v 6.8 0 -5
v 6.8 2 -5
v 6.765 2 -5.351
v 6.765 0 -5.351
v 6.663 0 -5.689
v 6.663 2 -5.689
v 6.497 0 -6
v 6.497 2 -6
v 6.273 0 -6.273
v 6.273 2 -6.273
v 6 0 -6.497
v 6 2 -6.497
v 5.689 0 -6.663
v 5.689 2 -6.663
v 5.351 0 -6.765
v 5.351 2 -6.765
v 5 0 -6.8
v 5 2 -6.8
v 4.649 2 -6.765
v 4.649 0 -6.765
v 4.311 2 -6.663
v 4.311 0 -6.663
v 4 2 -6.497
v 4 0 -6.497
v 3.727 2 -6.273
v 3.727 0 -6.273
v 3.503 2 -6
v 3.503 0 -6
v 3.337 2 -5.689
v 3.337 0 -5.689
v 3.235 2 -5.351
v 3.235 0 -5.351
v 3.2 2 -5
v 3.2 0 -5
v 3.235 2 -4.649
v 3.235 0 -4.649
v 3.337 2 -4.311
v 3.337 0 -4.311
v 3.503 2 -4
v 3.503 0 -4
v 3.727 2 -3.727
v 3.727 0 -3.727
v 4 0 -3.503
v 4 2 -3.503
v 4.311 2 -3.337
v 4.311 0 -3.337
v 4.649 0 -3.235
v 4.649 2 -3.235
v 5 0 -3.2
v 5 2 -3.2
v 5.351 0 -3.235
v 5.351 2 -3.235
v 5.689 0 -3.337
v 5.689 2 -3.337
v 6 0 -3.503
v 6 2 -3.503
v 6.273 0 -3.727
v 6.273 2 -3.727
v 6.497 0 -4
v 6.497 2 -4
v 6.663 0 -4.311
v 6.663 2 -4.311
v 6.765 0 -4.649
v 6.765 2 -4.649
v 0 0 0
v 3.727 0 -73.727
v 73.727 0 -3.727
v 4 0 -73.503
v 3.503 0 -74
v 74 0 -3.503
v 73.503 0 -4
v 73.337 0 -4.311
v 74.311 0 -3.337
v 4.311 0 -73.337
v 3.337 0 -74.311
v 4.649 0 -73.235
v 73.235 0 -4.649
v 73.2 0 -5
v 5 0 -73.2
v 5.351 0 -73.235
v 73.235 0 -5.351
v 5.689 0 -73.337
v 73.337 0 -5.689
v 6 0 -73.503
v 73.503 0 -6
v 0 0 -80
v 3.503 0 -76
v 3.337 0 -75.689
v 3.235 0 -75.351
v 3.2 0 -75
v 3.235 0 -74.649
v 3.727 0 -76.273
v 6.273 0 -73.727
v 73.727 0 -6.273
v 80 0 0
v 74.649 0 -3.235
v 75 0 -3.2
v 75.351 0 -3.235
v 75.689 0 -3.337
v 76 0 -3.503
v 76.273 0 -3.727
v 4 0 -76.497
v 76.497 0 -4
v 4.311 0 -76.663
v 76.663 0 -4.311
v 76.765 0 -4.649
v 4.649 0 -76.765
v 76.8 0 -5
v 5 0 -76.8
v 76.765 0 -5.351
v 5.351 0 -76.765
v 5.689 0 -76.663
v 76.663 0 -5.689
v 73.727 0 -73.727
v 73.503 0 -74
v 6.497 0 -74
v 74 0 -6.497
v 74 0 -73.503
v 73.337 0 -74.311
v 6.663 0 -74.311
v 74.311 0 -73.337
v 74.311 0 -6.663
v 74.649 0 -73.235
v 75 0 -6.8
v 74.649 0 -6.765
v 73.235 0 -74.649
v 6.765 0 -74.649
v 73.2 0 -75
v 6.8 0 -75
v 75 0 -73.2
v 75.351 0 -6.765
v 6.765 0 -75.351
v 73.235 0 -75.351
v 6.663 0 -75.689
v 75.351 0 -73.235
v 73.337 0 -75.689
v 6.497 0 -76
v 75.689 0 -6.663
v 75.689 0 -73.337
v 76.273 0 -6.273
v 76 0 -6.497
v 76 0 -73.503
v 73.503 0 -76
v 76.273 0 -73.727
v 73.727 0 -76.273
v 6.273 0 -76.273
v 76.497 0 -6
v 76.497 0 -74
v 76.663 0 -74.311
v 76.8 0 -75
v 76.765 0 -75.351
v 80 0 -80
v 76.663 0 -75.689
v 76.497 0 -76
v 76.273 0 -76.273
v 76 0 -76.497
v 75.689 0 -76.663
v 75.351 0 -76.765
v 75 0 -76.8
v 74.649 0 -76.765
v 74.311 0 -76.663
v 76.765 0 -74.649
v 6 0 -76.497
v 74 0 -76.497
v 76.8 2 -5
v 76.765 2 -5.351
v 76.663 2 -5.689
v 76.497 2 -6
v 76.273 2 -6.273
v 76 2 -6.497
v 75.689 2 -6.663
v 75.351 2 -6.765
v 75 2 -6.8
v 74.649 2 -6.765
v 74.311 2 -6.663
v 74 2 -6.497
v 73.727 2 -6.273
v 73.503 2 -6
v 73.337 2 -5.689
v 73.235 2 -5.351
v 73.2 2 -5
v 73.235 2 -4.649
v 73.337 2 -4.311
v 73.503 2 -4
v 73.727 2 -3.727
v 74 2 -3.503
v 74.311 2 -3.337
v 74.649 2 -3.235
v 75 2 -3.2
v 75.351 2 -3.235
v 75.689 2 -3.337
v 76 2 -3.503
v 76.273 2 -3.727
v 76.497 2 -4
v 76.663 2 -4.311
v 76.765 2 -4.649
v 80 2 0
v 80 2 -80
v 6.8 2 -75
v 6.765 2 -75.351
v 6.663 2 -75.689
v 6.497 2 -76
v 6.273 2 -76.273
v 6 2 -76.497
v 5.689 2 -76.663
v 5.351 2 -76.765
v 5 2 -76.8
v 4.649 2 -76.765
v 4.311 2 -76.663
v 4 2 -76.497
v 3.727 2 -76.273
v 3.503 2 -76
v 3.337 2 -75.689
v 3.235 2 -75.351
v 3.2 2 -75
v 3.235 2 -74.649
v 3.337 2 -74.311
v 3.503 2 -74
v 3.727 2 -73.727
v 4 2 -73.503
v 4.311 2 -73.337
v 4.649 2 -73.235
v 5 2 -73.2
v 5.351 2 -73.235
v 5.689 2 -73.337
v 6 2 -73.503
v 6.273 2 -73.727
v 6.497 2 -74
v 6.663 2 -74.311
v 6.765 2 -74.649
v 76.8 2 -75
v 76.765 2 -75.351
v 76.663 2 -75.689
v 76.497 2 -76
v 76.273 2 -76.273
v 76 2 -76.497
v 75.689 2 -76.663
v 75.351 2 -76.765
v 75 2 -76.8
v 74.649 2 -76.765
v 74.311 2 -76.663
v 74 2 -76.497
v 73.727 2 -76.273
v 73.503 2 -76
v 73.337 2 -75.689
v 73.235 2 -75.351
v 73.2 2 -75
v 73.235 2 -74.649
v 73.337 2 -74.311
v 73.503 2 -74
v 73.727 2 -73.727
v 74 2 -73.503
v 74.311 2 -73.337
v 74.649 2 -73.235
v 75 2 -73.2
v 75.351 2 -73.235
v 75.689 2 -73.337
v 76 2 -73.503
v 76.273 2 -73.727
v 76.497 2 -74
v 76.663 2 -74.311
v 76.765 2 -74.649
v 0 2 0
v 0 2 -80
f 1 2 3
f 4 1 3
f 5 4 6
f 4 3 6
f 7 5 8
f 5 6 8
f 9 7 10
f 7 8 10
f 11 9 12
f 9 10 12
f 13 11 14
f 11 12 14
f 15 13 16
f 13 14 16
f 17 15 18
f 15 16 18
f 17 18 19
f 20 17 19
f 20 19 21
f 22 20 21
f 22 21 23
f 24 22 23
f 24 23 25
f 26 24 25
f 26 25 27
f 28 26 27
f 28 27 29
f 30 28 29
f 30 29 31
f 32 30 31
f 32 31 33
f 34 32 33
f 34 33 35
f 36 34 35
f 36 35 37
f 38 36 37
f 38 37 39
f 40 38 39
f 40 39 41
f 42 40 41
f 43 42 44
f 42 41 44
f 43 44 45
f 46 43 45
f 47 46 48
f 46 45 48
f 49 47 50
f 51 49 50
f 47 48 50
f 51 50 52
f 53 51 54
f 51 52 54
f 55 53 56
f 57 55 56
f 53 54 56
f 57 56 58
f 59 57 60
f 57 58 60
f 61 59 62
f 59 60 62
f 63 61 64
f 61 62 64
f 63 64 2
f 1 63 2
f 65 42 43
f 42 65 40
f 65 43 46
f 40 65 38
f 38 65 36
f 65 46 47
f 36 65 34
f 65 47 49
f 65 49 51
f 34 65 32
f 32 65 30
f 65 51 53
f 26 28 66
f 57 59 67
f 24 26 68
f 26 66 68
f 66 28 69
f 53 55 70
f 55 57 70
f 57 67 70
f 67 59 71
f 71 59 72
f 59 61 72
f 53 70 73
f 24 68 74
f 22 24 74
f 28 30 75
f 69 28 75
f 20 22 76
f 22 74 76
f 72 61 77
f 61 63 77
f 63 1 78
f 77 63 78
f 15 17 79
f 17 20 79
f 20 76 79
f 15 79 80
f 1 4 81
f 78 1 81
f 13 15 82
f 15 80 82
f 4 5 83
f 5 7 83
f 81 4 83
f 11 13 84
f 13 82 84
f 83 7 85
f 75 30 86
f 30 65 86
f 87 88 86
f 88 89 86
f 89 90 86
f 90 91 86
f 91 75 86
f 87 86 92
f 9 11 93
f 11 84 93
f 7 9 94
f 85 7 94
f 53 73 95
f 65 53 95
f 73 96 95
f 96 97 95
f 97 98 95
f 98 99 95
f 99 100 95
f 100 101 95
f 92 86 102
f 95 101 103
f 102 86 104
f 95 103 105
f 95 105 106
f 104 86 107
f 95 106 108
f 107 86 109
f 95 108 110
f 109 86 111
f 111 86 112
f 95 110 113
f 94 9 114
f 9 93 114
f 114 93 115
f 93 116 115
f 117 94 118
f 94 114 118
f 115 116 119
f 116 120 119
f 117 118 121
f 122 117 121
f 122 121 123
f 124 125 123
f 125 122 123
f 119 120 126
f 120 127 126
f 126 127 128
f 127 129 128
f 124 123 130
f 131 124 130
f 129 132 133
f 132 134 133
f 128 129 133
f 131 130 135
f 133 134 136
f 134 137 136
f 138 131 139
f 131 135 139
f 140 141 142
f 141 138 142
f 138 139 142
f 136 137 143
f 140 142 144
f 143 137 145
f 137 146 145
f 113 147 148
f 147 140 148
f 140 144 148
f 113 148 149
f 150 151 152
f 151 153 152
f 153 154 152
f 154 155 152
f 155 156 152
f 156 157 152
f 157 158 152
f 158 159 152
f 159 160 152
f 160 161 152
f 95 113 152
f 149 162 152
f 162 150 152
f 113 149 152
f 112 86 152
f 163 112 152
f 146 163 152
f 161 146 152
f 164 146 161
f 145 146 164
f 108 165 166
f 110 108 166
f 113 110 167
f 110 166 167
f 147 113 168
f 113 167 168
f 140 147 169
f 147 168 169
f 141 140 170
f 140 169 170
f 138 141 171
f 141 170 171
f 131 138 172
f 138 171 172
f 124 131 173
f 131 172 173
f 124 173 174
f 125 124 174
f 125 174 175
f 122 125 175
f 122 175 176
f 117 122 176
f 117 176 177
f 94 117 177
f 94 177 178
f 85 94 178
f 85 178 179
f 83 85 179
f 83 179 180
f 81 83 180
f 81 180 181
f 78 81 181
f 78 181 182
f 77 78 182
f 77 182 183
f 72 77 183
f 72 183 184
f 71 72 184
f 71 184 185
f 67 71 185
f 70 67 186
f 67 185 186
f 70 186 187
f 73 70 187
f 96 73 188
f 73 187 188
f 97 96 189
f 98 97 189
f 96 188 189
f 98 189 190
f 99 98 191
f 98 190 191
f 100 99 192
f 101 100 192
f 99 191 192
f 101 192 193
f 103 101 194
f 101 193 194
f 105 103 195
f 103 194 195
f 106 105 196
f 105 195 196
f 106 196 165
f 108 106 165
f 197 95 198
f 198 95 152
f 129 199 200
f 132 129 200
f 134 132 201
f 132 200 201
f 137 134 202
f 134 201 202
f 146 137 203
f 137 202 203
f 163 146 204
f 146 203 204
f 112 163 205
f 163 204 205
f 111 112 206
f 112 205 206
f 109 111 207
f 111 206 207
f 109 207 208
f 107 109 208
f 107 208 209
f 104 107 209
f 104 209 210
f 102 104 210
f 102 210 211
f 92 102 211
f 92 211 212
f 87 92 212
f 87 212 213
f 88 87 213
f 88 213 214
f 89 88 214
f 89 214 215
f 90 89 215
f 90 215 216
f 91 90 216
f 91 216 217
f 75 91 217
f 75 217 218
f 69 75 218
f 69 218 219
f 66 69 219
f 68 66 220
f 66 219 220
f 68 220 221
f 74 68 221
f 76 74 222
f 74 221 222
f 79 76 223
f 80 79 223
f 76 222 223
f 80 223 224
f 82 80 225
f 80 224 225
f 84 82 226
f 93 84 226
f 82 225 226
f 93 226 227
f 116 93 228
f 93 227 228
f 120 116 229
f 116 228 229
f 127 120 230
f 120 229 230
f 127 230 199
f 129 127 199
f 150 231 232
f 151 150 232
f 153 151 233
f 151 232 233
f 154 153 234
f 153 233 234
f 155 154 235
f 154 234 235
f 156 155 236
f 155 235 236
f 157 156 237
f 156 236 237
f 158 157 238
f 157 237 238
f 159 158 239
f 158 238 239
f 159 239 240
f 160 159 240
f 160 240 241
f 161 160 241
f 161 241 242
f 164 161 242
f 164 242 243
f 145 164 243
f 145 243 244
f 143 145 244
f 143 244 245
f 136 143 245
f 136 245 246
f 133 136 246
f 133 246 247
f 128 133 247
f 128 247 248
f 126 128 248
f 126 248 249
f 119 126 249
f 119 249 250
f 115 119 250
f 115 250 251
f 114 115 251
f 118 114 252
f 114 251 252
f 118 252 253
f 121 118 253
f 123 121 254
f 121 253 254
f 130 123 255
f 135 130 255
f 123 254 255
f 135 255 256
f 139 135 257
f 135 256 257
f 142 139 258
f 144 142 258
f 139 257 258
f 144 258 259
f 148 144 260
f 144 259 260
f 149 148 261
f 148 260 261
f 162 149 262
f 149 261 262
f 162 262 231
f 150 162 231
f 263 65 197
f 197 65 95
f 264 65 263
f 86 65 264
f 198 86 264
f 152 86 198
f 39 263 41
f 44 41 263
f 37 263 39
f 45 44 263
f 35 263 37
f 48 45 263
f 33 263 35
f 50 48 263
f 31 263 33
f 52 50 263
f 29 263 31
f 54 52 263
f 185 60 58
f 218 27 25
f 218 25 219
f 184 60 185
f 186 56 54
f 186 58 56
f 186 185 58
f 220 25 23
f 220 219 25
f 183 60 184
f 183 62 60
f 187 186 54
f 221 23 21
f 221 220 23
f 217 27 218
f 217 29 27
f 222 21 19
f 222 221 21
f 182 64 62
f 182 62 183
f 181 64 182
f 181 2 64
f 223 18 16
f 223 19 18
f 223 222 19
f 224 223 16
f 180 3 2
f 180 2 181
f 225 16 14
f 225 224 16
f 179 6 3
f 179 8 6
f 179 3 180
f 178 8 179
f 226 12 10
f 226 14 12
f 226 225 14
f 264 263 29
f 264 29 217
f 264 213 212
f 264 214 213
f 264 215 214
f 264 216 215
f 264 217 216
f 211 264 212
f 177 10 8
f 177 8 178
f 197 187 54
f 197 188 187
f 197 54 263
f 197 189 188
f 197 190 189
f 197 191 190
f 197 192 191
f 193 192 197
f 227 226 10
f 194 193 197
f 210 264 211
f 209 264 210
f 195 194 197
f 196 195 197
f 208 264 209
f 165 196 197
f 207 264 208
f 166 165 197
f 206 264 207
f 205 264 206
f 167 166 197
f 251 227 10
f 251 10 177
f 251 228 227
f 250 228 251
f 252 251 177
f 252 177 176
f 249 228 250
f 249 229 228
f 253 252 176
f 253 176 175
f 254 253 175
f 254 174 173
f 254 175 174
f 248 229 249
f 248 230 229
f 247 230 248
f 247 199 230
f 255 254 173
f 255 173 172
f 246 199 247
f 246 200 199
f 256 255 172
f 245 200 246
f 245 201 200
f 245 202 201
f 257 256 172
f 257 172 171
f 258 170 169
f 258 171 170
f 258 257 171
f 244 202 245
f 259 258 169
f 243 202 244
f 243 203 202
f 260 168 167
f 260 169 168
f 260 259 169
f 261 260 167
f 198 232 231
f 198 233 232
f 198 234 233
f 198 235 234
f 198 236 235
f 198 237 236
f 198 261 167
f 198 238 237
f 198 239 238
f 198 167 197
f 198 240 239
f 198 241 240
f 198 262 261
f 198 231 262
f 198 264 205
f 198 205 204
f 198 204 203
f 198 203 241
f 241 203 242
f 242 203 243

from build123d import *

# Parameters (mm, degrees)
SKETCH1_W              = 80
SKETCH1_H              = 80
PCB_DEPTH              = 2
SKETCH2_R              = 1.8
ATTACHMENT_HOLES_DEPTH = 3
LPATTERN1_COUNT        = 2
LPATTERN1_PITCH        = 70
LPATTERN1_COUNT_DIR2   = 2
LPATTERN1_PITCH_DIR2   = 70


with BuildPart() as part:
    # Sketch1 → PCB (new body)
    with BuildSketch(Plane(origin=(0, 0, 0), x_dir=(1, 0, 0), z_dir=(0, 1, 0))):
        with Locations((40, 40)):
            Rectangle(SKETCH1_W, SKETCH1_H)
    extrude(amount=PCB_DEPTH)

    # Sketch2 → Attachment Holes (cut, through all)
    with BuildSketch(Plane(origin=(0, 2, 0), x_dir=(1, 0, 0), z_dir=(0, 1, 0))):
        with Locations((5, 75)):
            Circle(SKETCH2_R)
    attachment_holes = extrude(amount=-ATTACHMENT_HOLES_DEPTH, mode=Mode.SUBTRACT)

    # LPattern1: Attachment Holes 2 × 2
    with Locations(*[(i * LPATTERN1_PITCH, 0, j * LPATTERN1_PITCH_DIR2) for i in range(LPATTERN1_COUNT) for j in range(LPATTERN1_COUNT_DIR2) if (i, j) != (0, 0)]):
        add(attachment_holes, mode=Mode.SUBTRACT)


solid = part.part
